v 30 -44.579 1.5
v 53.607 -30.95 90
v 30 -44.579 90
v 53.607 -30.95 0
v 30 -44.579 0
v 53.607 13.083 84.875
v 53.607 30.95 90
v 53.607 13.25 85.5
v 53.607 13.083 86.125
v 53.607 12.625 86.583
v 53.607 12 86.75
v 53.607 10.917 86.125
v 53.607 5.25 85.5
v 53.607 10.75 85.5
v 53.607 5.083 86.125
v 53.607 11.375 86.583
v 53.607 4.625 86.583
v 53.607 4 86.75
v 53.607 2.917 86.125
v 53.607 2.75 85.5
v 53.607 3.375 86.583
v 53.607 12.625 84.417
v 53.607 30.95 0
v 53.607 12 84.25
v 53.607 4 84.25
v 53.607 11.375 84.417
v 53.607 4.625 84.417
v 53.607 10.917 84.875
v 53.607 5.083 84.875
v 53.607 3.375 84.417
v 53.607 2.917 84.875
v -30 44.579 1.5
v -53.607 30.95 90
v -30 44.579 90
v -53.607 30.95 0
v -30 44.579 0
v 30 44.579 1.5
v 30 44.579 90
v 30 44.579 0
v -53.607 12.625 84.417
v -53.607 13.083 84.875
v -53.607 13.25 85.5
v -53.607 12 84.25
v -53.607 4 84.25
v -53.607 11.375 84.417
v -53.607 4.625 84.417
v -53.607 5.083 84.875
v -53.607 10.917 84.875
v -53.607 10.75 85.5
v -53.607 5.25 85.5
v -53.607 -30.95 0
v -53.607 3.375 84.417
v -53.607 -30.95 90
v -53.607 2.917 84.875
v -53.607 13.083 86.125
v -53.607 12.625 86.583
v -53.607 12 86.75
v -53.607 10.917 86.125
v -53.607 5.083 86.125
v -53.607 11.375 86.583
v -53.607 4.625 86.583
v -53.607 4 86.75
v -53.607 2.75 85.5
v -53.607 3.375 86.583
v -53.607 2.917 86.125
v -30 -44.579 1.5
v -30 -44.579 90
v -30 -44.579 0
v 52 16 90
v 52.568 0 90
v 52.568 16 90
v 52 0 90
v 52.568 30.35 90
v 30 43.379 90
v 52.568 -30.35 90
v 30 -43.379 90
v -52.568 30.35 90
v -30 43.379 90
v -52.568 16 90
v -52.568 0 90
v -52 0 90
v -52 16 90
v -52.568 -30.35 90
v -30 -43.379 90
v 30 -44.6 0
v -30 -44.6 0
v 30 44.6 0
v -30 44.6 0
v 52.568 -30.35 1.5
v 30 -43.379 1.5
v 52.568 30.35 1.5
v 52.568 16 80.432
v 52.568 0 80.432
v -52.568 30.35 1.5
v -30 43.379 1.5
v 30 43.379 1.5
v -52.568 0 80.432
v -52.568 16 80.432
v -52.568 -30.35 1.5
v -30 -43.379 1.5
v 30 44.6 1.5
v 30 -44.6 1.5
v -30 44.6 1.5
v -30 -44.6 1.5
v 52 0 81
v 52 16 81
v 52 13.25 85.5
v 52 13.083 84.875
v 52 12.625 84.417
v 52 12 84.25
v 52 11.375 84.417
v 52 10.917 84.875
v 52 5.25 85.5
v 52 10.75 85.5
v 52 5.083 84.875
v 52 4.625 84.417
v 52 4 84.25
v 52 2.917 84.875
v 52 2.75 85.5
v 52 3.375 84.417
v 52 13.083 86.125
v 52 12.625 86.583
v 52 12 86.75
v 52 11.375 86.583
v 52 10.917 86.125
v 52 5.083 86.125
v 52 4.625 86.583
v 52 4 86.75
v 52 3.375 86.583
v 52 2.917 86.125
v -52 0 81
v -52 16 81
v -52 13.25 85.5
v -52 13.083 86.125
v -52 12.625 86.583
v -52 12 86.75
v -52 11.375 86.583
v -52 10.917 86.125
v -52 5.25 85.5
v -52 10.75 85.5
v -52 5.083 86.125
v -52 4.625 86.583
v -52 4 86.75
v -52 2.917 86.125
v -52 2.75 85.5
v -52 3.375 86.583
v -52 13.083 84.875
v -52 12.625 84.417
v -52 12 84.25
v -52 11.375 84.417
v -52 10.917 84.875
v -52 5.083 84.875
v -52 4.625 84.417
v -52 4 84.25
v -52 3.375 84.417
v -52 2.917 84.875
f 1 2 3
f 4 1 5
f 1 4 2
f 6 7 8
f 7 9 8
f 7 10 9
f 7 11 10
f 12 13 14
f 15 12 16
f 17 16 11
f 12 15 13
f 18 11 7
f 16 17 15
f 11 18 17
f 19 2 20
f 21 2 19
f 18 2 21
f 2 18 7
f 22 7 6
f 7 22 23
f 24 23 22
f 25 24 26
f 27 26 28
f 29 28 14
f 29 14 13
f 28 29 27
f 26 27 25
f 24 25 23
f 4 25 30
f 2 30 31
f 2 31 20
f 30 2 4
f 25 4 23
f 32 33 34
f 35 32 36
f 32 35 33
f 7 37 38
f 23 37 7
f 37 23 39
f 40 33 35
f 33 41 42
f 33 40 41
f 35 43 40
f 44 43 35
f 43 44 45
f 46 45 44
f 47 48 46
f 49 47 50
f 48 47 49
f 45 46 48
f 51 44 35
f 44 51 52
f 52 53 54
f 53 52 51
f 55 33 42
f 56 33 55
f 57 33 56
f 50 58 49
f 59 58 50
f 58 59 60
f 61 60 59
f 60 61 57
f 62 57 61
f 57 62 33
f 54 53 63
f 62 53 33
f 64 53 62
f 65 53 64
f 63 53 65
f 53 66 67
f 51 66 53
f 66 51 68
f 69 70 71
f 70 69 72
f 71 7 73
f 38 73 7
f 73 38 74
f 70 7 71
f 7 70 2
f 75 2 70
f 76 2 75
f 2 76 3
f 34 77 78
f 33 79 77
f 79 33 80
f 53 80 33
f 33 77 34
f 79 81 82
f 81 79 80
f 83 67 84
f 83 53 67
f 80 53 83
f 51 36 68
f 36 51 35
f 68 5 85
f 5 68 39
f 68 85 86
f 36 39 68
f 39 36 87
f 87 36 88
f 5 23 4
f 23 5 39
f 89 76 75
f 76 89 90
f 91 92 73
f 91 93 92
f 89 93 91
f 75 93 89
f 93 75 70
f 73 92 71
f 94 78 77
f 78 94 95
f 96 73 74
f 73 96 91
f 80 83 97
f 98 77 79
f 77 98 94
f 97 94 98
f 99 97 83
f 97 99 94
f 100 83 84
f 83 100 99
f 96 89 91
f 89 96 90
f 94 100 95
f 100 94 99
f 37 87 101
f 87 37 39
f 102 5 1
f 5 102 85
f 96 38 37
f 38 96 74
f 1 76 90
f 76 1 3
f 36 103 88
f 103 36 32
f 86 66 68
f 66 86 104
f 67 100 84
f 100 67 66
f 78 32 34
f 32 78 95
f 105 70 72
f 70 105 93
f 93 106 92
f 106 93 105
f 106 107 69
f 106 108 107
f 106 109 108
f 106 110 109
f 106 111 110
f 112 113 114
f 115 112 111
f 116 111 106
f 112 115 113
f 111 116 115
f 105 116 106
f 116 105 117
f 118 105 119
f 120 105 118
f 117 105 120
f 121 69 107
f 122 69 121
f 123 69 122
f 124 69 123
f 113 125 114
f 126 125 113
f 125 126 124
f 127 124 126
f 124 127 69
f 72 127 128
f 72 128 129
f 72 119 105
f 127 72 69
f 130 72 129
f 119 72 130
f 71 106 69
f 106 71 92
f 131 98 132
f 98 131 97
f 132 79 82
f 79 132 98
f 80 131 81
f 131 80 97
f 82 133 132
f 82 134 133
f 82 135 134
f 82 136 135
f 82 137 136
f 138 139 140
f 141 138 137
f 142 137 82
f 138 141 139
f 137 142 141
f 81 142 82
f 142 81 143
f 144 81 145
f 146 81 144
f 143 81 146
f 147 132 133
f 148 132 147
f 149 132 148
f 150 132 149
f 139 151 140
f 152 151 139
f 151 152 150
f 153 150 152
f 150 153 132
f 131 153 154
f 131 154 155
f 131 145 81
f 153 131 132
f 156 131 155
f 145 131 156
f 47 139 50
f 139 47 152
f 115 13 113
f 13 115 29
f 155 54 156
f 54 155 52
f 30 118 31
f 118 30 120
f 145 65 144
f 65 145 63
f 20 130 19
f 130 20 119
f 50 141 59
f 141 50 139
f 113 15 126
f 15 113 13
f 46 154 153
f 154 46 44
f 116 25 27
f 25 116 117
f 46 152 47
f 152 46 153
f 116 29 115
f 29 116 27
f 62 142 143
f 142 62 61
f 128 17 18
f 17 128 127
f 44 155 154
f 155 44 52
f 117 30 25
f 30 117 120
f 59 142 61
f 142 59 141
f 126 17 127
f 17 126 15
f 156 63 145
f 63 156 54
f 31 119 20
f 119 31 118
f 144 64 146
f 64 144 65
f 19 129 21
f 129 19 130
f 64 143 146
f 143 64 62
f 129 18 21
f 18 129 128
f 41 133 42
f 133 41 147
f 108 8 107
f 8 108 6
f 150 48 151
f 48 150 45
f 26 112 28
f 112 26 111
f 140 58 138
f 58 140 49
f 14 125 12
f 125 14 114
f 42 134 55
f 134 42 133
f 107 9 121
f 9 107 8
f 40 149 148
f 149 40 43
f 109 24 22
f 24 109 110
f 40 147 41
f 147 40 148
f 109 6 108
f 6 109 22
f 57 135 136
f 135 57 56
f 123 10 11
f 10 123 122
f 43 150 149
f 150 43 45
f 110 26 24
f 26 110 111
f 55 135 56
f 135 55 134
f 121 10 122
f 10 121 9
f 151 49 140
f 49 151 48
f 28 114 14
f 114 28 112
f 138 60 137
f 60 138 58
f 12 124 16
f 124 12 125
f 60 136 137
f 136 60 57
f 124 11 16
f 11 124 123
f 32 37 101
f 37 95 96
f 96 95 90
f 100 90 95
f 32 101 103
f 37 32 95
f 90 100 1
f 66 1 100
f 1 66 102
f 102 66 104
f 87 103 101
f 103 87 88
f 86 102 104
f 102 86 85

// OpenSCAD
$fn=12;
difference(){
union(){
difference(){
rotate([0,0,30])cylinder(d=123.8,h=90,$fn=6);
rotate([0,0,30])translate([0,0,1.5])
    cylinder(d=121.4,h=130,$fn=6);
translate([0,0,50])cube([60,140,144],center=true);
}
mirror([1,0,0])translate([-53,16,80])rotate([90,0,0])
linear_extrude(16){
polygon([[0,0],[1,1],[1,10],[0,10]]);
}
translate([-53,16,80])rotate([90,0,0])
linear_extrude(16){
polygon([[0,0],[1,1],[1,10],[0,10]]);
}
}
translate([0,4,85.5])rotate([0,90,0])cylinder(d=2.5,h=200,center=true);
translate([0,12,85.5])rotate([0,90,0])cylinder(d=2.5,h=200,center=true);
}

translate([0,0,.75])cube([60,89.2,1.5],center=true);
